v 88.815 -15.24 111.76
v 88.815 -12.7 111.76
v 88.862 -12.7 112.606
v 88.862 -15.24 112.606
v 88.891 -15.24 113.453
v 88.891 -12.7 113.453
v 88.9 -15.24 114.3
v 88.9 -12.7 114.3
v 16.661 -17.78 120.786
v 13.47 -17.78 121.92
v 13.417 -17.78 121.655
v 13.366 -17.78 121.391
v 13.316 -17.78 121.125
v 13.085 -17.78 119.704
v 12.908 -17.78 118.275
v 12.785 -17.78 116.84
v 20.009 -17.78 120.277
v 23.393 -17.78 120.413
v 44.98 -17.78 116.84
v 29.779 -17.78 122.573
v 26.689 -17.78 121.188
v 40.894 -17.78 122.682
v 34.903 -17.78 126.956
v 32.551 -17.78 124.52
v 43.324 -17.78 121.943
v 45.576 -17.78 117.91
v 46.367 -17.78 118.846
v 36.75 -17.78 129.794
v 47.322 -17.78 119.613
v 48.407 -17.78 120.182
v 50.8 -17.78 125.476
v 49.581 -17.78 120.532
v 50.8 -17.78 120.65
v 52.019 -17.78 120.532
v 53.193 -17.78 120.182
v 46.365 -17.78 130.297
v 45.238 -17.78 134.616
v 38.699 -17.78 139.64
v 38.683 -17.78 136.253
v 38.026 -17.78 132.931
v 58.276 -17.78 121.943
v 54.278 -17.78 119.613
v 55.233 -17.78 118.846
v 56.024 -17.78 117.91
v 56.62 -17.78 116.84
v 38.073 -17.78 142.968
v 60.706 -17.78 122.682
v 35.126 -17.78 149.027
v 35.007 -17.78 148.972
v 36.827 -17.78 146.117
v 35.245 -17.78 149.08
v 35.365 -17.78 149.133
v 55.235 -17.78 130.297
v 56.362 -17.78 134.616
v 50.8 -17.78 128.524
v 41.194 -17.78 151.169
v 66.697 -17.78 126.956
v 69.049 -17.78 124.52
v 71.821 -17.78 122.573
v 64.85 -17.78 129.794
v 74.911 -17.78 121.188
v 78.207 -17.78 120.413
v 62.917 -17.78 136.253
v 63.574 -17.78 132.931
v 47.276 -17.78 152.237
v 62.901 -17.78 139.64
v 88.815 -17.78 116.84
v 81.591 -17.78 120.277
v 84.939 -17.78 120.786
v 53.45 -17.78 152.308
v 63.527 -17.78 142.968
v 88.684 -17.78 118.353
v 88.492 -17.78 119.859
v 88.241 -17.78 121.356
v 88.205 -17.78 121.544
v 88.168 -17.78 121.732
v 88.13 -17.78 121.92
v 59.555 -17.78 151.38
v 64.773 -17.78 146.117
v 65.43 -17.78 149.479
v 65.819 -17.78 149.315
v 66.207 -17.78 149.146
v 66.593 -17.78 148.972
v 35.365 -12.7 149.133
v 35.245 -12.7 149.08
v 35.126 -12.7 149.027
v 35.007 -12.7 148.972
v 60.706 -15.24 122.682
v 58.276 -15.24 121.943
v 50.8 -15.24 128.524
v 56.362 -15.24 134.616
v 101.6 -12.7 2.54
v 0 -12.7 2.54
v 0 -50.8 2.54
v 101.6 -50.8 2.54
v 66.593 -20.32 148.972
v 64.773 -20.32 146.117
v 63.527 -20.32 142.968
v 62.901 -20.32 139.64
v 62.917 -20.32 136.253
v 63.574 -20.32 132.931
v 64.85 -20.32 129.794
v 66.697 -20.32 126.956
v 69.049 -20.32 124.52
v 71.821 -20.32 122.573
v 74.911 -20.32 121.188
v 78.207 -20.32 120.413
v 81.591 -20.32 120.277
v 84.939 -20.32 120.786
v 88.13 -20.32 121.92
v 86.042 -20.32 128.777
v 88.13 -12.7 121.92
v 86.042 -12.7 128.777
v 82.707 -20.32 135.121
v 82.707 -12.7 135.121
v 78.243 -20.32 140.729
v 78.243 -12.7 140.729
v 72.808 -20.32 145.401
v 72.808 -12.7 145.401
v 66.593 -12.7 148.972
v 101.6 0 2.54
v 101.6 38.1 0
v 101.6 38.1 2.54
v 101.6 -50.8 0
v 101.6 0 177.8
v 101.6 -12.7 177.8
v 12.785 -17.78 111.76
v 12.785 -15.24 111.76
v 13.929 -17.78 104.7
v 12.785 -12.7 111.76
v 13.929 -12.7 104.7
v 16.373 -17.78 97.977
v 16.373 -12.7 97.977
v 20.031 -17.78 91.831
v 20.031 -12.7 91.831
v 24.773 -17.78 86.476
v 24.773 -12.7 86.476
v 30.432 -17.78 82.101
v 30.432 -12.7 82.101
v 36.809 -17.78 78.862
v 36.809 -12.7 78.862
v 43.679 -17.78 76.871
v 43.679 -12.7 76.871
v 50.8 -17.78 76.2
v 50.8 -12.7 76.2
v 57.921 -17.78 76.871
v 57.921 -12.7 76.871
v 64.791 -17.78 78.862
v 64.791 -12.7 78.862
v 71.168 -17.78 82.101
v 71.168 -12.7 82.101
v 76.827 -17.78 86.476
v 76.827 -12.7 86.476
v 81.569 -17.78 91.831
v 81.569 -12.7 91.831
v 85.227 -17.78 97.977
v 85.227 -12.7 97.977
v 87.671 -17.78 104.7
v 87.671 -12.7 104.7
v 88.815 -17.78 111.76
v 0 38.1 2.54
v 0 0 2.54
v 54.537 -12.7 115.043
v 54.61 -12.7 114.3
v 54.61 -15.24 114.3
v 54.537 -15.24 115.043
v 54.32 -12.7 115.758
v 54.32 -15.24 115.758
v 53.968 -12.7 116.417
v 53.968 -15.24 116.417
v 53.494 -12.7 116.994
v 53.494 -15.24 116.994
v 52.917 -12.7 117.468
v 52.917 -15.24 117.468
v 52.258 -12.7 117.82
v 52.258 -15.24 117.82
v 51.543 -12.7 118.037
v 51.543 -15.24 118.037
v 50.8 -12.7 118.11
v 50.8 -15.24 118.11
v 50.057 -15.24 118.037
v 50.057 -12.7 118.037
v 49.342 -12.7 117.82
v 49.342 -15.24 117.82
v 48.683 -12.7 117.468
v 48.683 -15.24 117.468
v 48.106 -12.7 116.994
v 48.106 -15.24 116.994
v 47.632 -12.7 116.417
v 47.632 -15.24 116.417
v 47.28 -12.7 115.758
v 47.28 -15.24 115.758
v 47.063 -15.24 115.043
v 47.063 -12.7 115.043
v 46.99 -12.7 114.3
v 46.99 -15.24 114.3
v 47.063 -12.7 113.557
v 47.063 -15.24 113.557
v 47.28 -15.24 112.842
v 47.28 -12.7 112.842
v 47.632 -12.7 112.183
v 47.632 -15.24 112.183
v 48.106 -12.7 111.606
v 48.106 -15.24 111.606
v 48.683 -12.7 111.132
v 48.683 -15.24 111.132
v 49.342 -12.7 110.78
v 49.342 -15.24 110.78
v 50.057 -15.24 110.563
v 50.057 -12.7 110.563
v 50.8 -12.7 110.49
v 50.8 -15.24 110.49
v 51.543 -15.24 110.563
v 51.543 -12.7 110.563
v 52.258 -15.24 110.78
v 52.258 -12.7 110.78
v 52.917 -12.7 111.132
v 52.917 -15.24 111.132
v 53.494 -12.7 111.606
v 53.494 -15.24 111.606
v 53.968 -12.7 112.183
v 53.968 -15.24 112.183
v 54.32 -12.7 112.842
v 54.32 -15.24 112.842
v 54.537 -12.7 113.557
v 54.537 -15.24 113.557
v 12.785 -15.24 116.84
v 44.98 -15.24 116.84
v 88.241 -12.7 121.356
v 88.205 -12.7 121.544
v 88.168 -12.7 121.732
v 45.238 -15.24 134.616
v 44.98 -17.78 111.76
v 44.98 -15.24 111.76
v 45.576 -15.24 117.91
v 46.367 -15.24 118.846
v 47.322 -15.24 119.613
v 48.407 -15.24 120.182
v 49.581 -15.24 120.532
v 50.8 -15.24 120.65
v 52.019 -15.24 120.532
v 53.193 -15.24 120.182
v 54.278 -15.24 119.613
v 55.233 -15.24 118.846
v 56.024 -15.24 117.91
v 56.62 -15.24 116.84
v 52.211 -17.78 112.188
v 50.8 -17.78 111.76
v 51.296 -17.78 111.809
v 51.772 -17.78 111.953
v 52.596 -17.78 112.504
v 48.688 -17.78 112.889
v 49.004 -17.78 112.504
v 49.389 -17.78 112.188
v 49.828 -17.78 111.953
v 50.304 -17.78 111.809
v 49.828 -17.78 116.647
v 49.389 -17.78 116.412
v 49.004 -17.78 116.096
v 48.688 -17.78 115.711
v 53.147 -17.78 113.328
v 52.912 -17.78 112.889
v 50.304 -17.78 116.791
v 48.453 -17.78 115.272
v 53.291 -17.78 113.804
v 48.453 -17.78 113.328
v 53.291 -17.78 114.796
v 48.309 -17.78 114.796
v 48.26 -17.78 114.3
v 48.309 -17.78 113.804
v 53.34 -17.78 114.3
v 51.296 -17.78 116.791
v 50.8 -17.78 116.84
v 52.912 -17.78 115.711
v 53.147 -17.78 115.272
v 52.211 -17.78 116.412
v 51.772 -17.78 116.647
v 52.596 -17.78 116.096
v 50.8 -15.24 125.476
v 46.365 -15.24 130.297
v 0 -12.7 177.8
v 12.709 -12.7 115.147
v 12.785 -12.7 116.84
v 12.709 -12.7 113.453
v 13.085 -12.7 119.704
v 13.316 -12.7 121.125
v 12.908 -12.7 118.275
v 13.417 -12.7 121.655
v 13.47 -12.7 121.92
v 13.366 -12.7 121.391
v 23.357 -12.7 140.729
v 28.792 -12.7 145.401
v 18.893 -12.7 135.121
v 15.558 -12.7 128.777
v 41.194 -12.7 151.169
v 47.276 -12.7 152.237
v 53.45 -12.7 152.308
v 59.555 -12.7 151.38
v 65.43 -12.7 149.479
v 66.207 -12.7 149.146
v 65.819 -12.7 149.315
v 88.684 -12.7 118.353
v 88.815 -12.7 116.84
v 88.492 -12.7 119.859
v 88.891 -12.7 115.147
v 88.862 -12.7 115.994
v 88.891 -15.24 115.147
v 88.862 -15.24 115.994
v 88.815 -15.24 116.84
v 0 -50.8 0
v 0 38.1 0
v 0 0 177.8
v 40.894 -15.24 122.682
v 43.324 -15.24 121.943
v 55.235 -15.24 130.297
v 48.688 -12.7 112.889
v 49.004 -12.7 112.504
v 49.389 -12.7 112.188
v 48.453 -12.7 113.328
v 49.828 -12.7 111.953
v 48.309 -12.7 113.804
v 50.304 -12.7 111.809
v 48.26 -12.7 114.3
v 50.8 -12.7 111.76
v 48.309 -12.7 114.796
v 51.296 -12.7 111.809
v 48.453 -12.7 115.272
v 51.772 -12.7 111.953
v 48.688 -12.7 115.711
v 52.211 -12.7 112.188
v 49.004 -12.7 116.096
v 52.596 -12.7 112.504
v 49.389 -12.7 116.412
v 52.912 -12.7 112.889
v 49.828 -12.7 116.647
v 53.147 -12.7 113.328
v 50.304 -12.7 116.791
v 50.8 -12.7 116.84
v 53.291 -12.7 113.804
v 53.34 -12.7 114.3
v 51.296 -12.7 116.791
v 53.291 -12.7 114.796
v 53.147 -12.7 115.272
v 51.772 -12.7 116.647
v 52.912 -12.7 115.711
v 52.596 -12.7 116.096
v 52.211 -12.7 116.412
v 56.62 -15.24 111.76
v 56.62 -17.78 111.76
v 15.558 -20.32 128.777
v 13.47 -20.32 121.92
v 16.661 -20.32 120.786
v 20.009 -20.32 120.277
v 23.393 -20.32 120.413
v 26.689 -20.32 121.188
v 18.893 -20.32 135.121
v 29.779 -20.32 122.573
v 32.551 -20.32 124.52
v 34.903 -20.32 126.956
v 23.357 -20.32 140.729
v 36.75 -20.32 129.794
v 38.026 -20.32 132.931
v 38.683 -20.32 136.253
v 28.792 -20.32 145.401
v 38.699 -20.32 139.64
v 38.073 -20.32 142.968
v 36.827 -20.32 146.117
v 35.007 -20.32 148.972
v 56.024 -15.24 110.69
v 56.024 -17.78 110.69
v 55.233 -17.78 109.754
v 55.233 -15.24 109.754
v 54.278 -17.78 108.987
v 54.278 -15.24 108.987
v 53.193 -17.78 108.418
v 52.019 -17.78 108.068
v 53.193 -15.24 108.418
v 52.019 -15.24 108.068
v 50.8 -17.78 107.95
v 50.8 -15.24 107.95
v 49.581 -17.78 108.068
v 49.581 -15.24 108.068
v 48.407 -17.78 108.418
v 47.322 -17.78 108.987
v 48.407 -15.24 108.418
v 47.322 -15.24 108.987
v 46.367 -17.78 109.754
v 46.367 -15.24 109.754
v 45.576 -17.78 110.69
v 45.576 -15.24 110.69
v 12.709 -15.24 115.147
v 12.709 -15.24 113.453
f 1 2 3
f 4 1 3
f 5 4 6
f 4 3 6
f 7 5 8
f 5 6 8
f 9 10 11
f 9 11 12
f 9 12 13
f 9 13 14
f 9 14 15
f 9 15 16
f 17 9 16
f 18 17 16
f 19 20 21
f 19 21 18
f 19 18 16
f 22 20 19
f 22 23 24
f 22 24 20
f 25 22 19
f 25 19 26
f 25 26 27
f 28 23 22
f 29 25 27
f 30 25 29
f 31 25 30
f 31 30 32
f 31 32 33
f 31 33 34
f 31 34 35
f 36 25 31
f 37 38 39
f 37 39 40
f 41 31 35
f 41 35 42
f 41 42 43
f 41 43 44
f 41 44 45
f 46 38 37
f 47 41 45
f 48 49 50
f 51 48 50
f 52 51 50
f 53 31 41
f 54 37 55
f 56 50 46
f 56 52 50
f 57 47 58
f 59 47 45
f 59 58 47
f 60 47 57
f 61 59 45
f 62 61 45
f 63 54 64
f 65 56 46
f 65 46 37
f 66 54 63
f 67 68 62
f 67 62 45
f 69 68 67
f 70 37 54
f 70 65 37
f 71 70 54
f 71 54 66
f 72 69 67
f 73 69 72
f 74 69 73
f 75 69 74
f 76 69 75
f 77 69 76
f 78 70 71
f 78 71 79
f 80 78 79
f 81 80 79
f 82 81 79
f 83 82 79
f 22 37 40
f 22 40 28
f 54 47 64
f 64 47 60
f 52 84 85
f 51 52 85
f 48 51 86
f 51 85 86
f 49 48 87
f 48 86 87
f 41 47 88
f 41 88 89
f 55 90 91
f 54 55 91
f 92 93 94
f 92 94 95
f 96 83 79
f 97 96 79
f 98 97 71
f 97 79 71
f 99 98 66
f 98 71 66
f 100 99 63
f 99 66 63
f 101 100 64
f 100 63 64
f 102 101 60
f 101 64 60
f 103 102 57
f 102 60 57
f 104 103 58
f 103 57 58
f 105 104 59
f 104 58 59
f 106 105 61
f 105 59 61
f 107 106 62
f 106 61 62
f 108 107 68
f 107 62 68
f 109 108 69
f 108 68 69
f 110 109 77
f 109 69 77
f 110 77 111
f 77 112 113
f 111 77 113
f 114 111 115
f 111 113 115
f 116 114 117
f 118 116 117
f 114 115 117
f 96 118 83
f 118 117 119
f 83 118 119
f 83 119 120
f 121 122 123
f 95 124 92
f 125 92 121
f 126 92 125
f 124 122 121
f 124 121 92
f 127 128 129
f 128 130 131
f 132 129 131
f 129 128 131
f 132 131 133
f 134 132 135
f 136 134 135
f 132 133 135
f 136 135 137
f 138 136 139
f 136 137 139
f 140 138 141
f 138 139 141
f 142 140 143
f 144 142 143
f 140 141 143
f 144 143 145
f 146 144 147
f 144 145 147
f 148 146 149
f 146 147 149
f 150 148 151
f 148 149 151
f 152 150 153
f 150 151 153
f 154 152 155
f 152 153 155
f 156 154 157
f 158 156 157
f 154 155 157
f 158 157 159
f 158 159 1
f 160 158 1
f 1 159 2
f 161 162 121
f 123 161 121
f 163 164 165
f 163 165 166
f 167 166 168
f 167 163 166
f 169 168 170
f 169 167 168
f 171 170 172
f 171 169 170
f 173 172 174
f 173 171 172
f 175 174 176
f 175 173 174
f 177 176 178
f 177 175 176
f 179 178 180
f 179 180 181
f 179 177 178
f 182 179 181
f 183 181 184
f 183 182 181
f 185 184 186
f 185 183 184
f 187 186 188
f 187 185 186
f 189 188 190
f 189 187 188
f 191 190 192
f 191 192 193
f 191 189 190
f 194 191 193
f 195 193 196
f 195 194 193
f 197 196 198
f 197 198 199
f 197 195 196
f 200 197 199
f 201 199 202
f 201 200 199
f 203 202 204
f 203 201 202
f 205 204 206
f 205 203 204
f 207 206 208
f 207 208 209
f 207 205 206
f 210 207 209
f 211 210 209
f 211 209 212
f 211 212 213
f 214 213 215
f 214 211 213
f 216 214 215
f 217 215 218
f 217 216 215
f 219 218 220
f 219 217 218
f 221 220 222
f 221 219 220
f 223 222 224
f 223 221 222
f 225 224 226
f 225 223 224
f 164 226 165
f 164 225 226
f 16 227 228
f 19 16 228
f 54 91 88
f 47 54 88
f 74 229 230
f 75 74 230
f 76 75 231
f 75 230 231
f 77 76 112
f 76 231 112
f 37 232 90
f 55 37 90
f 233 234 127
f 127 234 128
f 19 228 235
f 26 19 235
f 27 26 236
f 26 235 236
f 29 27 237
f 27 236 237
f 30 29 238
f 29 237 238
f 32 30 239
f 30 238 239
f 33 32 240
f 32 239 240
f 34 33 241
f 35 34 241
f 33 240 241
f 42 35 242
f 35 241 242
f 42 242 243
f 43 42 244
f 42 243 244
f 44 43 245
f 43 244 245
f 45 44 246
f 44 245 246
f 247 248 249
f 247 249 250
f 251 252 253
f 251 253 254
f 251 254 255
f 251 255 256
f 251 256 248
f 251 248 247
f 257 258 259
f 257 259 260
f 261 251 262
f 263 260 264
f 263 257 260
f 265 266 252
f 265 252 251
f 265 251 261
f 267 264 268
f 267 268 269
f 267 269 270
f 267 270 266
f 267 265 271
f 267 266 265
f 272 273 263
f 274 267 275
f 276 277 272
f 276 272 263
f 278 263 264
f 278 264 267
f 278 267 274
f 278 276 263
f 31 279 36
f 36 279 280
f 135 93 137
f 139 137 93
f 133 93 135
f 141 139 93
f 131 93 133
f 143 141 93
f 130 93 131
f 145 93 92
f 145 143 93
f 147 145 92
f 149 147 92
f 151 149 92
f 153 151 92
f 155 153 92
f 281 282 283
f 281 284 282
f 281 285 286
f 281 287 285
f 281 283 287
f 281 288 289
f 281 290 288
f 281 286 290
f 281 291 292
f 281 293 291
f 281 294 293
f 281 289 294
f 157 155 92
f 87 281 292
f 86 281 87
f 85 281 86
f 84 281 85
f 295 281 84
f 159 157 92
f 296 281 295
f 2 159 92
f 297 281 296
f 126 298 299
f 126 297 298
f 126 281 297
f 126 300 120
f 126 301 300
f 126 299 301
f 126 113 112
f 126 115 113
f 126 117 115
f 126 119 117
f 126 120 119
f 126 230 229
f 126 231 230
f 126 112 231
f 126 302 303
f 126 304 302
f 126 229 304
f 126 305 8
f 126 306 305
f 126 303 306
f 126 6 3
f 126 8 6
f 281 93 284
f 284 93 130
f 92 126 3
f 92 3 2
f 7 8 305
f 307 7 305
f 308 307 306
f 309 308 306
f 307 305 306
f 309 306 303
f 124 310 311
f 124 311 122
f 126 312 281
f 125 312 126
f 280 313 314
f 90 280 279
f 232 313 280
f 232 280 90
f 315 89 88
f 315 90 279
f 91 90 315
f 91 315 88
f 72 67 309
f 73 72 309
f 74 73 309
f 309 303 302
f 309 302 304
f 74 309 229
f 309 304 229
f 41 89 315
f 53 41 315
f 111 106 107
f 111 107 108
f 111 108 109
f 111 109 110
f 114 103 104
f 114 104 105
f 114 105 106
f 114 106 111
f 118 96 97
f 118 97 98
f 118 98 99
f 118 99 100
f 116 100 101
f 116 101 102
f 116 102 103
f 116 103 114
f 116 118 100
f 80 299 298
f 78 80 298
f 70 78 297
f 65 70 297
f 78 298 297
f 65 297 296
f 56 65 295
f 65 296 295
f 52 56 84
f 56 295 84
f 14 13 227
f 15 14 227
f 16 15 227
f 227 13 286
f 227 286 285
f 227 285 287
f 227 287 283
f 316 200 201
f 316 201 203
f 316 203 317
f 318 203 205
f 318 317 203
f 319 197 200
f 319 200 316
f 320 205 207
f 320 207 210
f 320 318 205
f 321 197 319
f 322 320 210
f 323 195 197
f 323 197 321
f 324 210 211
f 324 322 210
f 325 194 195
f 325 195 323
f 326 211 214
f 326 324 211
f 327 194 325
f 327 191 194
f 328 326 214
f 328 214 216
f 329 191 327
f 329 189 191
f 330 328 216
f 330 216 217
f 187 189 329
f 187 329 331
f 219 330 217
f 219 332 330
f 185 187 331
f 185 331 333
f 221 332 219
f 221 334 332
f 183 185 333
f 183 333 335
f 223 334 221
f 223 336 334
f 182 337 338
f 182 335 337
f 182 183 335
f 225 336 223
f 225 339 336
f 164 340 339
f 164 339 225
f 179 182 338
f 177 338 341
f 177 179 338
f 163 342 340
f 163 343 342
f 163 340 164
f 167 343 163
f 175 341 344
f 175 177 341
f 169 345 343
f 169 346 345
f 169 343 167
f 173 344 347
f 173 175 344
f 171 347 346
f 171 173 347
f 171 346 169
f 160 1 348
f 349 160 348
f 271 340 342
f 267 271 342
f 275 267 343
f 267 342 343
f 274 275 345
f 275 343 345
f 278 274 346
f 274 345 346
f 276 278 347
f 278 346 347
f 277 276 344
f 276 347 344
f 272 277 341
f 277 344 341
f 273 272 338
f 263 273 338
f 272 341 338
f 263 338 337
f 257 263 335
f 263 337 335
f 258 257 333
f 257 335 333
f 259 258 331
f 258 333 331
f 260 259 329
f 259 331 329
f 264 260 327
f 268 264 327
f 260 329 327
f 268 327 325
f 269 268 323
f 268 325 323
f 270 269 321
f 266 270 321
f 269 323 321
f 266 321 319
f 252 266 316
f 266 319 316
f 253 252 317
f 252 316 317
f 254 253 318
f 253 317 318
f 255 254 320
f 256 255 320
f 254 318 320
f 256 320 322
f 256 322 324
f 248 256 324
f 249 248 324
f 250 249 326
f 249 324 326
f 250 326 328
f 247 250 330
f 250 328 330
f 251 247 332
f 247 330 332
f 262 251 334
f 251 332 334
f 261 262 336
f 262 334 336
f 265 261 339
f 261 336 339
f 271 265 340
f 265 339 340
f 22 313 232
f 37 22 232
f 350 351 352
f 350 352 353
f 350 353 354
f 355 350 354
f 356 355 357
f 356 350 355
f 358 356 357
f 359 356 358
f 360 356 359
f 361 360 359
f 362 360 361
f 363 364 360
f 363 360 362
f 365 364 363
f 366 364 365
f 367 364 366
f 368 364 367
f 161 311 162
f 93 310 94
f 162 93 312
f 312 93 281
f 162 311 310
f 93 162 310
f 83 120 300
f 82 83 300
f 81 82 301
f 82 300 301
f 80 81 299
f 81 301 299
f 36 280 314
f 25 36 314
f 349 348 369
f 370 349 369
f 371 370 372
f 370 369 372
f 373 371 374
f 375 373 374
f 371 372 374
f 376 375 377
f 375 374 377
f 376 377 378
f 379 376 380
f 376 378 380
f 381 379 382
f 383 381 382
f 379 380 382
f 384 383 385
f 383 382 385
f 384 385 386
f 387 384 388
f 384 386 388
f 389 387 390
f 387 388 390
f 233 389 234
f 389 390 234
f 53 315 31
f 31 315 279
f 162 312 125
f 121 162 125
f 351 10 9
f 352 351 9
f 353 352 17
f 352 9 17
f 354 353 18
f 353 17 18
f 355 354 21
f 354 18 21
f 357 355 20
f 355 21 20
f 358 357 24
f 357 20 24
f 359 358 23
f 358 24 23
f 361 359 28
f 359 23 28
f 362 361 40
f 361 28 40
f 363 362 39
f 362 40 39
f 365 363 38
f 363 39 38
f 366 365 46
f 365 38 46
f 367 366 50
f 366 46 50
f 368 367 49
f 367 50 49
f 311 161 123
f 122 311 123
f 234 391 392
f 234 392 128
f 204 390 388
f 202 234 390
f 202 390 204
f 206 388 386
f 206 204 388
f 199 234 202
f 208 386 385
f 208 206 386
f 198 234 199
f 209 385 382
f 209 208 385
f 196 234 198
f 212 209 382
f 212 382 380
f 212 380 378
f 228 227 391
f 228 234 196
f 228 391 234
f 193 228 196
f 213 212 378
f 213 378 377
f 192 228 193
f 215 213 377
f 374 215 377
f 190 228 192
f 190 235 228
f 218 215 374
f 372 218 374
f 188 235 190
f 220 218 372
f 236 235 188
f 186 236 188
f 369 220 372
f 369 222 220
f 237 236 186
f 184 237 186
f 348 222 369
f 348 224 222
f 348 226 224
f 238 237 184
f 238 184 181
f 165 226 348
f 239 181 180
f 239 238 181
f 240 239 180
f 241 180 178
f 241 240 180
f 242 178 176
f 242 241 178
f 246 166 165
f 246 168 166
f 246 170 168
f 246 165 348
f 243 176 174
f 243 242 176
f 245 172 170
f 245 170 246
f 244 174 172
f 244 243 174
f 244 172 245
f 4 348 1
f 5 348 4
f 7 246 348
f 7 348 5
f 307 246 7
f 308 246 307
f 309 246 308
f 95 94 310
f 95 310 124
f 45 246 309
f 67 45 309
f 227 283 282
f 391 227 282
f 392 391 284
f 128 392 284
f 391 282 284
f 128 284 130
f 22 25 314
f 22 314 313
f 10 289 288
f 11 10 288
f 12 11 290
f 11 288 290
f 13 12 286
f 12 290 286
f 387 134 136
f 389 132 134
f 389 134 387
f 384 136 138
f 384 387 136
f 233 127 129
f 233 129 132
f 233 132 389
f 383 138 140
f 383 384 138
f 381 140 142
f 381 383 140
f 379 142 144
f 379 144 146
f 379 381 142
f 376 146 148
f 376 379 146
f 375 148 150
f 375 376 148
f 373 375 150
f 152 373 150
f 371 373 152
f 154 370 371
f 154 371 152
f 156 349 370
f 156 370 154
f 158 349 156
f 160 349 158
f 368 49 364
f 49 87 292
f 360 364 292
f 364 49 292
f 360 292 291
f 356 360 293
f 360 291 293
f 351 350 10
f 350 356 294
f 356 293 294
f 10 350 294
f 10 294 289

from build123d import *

# Parameters (mm, degrees)
F0_W          = 101.6
F0_H          = 175.26
F1_DEPTH      = 12.7
F0_H_2        = 2.54
F2_DEPTH      = 50.8
F2_DEPTH_BACK = 38.1
F4_DEPTH      = 7.62
F3_R          = 2.54
F5_DEPTH      = 5.08
F3_R_2        = 3.81
F6_DEPTH      = 2.54


with BuildPart() as f1:
    # F0 (on Front) → F1 (new body)
    with BuildSketch(Plane.XZ):
        with Locations((50.8, 90.17)):
            Rectangle(F0_W, F0_H)
    extrude(amount=F1_DEPTH)

    # F0 (on Front) → F2 (join, two sides)
    with BuildSketch(Plane.XZ) as f2_sk:
        with Locations((50.8, 1.27)):
            Rectangle(F0_W, F0_H_2)
    extrude(amount=F2_DEPTH)
    extrude(f2_sk.sketch, amount=-F2_DEPTH_BACK)

    # F3 (on face) → F4 (join)
    with BuildSketch(Plane.XZ.offset(12.7)):
        with BuildLine():
            ThreePointArc((66.593426, 148.972434), (66.697351, 126.95609), (88.130224, 121.92))
            ThreePointArc((88.130224, 121.92), (80.607534, 138.030169), (66.593426, 148.972434))
        make_face()
        with BuildLine():
            ThreePointArc((13.469776, 121.92), (34.902649, 126.95609), (35.006574, 148.972434))
            ThreePointArc((35.006574, 148.972434), (20.992466, 138.030169), (13.469776, 121.92))
        make_face()
    extrude(amount=F4_DEPTH)

    # F3 (on face) → F5 (join)
    with BuildSketch(Plane.XZ.offset(12.7)):
        with BuildLine():
            ThreePointArc((12.784761, 111.76), (50.8, 76.2), (88.815239, 111.76))
            Line((88.815239, 111.76), (56.619871, 111.76))
            ThreePointArc((56.619871, 111.76), (50.8, 107.95), (44.980129, 111.76))
            Line((44.980129, 111.76), (12.784761, 111.76))
        make_face()
        with BuildLine():
            Line((56.619871, 116.84), (88.815239, 116.84))
            ThreePointArc((88.815239, 116.84), (88.5956, 119.106519), (88.24095, 121.355868))
            ThreePointArc((88.24095, 121.355868), (88.186651, 121.638143), (88.130224, 121.92))
            ThreePointArc((88.130224, 121.92), (66.697351, 126.95609), (66.593426, 148.972434))
            ThreePointArc((66.593426, 148.972434), (66.013621, 149.230727), (65.429595, 149.479326))
            ThreePointArc((65.429595, 149.479326), (50.361762, 152.39748), (35.365042, 149.133491))
            ThreePointArc((35.365042, 149.133491), (35.1856, 149.053425), (35.006574, 148.972434))
            ThreePointArc((35.006574, 148.972434), (34.902649, 126.95609), (13.469776, 121.92))
            ThreePointArc((13.469776, 121.92), (13.390944, 121.523058), (13.316333, 121.125301))
            ThreePointArc((13.316333, 121.125301), (12.989788, 118.990187), (12.784761, 116.84))
            Line((12.784761, 116.84), (44.980129, 116.84))
            ThreePointArc((44.980129, 116.84), (50.8, 120.65), (56.619871, 116.84))
        make_face()
        Polygon((43.324096, 121.942925), (40.894, 122.682), (45.237656, 134.616096), (50.8, 128.524), (56.362344, 134.616096), (60.706, 122.682), (58.275904, 121.942925), (55.235345, 130.296792), (50.8, 125.476), (46.364655, 130.296792), align=None, mode=Mode.SUBTRACT)
        with Locations((50.8, 114.3)):
            Circle(F3_R)
    extrude(amount=F5_DEPTH)

    # F3 (on face) → F6 (join)
    with BuildSketch(Plane.XZ.offset(12.7)):
        with BuildLine():
            ThreePointArc((12.784761, 116.84), (12.7, 114.3), (12.784761, 111.76))
            Line((12.784761, 111.76), (44.980129, 111.76))
            ThreePointArc((44.980129, 111.76), (44.45, 114.3), (44.980129, 116.84))
            Line((44.980129, 116.84), (12.784761, 116.84))
        make_face()
        with BuildLine():
            ThreePointArc((57.15, 114.3), (57.016055, 115.597366), (56.619871, 116.84))
            ThreePointArc((56.619871, 116.84), (50.8, 120.65), (44.980129, 116.84))
            ThreePointArc((44.980129, 116.84), (44.45, 114.3), (44.980129, 111.76))
            ThreePointArc((44.980129, 111.76), (50.8, 107.95), (56.619871, 111.76))
            ThreePointArc((56.619871, 111.76), (57.016055, 113.002634), (57.15, 114.3))
        make_face()
        with Locations((50.8, 114.3)):
            Circle(F3_R_2, mode=Mode.SUBTRACT)
        with BuildLine():
            ThreePointArc((88.815239, 111.76), (88.878804, 113.029293), (88.9, 114.3))
            ThreePointArc((88.9, 114.3), (88.878804, 115.570707), (88.815239, 116.84))
            Line((88.815239, 116.84), (56.619871, 116.84))
            ThreePointArc((56.619871, 116.84), (57.016055, 115.597366), (57.15, 114.3))
            ThreePointArc((57.15, 114.3), (57.016055, 113.002634), (56.619871, 111.76))
            Line((56.619871, 111.76), (88.815239, 111.76))
        make_face()
        Polygon((45.237656, 134.616096), (40.894, 122.682), (43.324096, 121.942925), (46.364655, 130.296792), (50.8, 125.476), (55.235345, 130.296792), (58.275904, 121.942925), (60.706, 122.682), (56.362344, 134.616096), (50.8, 128.524), align=None)
    extrude(amount=F6_DEPTH)


solid = f1.part
